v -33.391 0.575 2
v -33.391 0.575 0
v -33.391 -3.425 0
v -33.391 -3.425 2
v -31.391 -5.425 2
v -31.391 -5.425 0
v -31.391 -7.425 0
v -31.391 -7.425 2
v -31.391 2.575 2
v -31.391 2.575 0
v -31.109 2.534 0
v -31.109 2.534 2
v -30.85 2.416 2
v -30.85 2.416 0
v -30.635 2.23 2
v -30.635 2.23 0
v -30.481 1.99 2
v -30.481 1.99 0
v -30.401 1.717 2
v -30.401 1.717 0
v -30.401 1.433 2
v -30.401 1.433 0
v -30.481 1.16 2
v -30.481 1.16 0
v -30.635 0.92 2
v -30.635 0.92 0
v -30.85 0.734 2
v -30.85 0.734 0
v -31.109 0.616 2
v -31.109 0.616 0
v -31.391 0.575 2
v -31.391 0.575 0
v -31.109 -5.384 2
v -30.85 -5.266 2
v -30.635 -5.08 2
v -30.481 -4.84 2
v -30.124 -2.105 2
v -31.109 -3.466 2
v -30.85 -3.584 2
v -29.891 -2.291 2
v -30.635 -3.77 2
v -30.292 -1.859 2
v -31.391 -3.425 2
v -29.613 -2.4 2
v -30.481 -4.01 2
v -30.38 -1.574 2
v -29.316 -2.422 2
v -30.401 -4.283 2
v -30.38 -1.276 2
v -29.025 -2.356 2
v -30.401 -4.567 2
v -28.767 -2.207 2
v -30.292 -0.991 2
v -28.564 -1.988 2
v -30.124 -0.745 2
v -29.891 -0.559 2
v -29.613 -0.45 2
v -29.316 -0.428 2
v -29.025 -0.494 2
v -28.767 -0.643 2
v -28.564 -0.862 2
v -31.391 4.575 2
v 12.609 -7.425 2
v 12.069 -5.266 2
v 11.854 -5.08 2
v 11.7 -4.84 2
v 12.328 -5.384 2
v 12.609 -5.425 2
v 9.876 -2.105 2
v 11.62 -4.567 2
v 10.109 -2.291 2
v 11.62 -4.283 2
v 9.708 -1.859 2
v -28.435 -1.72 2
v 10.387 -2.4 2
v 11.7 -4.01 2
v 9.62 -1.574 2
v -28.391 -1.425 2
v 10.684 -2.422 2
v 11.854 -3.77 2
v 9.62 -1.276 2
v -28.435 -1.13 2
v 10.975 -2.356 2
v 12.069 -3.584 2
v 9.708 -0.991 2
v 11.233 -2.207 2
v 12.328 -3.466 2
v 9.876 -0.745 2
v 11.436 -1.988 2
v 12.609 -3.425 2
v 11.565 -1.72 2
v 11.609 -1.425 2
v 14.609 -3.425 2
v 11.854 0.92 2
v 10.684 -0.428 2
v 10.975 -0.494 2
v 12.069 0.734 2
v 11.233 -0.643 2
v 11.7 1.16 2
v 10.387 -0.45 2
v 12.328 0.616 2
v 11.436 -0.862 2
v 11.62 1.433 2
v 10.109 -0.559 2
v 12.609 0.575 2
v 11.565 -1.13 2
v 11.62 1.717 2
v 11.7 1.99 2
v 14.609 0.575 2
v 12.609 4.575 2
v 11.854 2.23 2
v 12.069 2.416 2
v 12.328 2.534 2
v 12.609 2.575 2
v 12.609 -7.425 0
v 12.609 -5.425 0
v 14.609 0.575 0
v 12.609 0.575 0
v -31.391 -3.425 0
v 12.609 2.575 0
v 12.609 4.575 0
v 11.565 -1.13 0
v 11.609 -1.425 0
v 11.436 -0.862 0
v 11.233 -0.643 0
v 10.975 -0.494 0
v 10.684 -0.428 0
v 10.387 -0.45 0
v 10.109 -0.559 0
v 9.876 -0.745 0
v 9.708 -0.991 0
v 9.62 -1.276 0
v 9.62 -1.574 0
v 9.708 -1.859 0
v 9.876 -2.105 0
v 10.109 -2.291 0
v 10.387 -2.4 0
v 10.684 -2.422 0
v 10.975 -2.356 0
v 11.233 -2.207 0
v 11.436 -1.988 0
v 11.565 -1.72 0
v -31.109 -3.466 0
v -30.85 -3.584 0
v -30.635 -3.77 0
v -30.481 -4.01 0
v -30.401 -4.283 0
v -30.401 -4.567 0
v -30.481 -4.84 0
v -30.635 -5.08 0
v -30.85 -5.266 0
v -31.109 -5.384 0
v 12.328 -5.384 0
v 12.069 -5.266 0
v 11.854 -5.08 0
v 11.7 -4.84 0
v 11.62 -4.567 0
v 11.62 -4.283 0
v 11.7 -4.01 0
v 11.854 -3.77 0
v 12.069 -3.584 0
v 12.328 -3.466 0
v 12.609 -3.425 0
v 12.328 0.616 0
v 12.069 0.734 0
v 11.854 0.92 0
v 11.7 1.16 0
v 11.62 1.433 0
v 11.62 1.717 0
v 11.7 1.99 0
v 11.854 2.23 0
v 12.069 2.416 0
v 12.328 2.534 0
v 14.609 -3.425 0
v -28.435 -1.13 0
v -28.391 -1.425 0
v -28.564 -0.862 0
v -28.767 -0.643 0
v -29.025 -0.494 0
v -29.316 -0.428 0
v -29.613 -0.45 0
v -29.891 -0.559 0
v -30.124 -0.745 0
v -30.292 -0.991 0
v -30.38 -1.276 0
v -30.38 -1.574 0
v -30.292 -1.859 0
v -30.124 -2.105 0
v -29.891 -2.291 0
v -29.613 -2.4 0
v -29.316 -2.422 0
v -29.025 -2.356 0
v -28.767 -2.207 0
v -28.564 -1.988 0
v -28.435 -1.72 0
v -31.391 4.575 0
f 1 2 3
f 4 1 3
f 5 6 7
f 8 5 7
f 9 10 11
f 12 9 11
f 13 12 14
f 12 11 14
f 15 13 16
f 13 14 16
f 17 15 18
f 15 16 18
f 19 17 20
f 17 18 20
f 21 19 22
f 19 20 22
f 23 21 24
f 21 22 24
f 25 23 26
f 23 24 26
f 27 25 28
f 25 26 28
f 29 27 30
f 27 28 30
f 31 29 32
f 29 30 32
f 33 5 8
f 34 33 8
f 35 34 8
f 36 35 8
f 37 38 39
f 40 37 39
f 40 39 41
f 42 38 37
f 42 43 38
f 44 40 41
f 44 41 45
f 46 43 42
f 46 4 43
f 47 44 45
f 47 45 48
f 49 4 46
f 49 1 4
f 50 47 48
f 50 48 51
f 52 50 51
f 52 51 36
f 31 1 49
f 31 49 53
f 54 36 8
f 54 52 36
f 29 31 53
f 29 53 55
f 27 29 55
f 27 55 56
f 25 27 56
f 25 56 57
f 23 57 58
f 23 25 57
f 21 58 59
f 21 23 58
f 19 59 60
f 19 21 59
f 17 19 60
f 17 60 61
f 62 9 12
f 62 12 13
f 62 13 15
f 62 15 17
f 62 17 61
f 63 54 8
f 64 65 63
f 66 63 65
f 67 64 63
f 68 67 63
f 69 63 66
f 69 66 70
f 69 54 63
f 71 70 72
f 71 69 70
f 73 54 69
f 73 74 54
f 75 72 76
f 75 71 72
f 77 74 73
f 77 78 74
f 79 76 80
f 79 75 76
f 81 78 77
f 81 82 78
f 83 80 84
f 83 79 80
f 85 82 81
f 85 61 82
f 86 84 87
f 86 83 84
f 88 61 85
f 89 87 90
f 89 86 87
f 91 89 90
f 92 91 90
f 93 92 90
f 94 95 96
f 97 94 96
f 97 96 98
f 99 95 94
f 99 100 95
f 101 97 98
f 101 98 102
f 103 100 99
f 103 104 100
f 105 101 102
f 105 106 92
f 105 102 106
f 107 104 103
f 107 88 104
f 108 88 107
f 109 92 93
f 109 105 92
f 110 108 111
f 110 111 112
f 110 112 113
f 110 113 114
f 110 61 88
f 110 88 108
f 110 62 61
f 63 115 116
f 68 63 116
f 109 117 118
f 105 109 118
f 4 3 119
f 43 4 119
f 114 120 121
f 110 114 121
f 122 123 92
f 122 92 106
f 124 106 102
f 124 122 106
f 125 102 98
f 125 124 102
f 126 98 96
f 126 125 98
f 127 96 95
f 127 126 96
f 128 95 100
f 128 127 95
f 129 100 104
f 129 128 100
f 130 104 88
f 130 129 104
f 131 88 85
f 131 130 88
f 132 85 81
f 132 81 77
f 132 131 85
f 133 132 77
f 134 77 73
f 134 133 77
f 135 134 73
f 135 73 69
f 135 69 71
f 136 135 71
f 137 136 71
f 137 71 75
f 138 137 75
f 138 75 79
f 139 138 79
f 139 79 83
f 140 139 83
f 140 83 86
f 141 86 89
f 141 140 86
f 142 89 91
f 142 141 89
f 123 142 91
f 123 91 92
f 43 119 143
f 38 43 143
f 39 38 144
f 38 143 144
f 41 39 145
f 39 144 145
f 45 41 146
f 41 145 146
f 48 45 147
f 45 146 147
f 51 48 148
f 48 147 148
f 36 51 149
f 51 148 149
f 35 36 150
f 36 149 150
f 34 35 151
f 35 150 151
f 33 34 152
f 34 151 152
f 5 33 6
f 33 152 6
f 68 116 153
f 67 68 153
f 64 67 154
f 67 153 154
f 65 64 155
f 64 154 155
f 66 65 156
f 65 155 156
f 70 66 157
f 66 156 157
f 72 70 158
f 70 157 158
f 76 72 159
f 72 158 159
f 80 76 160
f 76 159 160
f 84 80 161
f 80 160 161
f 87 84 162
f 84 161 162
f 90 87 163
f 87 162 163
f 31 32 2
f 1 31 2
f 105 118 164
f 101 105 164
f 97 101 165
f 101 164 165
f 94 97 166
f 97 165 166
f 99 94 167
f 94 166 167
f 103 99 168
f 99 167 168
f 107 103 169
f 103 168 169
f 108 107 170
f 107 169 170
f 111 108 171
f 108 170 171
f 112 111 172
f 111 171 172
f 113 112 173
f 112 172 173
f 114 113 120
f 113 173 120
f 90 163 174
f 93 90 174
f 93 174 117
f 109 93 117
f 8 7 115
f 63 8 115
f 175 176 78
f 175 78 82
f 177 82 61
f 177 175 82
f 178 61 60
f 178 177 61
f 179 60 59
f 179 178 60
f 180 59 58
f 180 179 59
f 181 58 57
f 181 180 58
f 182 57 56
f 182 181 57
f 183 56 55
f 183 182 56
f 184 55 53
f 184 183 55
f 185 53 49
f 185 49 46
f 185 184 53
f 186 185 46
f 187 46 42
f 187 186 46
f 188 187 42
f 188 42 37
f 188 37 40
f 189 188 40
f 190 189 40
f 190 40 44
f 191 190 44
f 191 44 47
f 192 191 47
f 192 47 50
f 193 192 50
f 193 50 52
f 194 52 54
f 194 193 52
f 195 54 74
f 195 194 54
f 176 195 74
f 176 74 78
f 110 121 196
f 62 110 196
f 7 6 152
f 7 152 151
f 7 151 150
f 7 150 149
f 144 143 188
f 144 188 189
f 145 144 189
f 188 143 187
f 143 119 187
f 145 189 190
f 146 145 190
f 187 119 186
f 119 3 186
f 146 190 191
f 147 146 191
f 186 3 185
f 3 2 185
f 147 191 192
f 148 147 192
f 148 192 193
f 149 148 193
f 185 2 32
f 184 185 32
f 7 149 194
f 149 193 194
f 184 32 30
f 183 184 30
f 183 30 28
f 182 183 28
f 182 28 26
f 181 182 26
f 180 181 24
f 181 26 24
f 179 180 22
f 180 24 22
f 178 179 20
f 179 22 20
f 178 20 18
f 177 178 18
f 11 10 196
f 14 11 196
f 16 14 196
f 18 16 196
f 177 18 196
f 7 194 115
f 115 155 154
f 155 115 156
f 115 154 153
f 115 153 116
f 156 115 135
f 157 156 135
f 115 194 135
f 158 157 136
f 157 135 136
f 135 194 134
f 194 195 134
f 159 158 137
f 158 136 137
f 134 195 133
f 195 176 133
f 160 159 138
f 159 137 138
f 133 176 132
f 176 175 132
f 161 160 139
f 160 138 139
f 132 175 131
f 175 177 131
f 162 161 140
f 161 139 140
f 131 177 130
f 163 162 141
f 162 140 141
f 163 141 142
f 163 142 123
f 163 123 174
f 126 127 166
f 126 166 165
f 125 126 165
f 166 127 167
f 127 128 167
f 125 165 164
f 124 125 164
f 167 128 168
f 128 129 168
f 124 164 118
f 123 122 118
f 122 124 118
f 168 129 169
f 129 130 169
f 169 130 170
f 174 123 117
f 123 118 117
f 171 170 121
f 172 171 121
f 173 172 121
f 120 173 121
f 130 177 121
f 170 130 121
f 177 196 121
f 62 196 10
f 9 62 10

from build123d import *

# Parameters (mm, degrees)
SKETCH_1_R      = 1
EXTRUDE_1_DEPTH = 2


with BuildPart() as part:
    # 草圖1 → 填料-伸長1 (new body)
    with BuildSketch(Plane.XY):
        with BuildLine():
            Line((-31.390669594, -5.425), (-31.390669594, -7.425))
            Line((-31.390669594, -7.425), (12.609330406, -7.425))
            Line((12.609330406, -7.425), (12.609330406, -5.425))
            ThreePointArc((12.609330406, -5.425), (11.609330406, -4.425), (12.609330406, -3.425))
            Line((12.609330406, -3.425), (14.609330406, -3.425))
            Line((14.609330406, -3.425), (14.609330406, 0.575))
            Line((14.609330406, 0.575), (12.609330406, 0.575))
            ThreePointArc((12.609330406, 0.575), (11.609330406, 1.575), (12.609330406, 2.575))
            Line((12.609330406, 2.575), (12.609330406, 4.575))
            Line((12.609330406, 4.575), (-31.390669594, 4.575))
            Line((-31.390669594, 4.575), (-31.390669594, 2.575))
            ThreePointArc((-31.390669594, 2.575), (-30.390669594, 1.575), (-31.390669594, 0.575))
            Line((-31.390669594, 0.575), (-33.390669594, 0.575))
            Line((-33.390669594, 0.575), (-33.390669594, -3.425))
            Line((-33.390669594, -3.425), (-31.390669594, -3.425))
            ThreePointArc((-31.390669594, -3.425), (-30.390669594, -4.425), (-31.390669594, -5.425))
        make_face()
        with Locations((-29.390669594, -1.425)):
            Circle(SKETCH_1_R, mode=Mode.SUBTRACT)
        with Locations((10.609330406, -1.425)):
            Circle(SKETCH_1_R, mode=Mode.SUBTRACT)
    extrude(amount=EXTRUDE_1_DEPTH)


solid = part.part
